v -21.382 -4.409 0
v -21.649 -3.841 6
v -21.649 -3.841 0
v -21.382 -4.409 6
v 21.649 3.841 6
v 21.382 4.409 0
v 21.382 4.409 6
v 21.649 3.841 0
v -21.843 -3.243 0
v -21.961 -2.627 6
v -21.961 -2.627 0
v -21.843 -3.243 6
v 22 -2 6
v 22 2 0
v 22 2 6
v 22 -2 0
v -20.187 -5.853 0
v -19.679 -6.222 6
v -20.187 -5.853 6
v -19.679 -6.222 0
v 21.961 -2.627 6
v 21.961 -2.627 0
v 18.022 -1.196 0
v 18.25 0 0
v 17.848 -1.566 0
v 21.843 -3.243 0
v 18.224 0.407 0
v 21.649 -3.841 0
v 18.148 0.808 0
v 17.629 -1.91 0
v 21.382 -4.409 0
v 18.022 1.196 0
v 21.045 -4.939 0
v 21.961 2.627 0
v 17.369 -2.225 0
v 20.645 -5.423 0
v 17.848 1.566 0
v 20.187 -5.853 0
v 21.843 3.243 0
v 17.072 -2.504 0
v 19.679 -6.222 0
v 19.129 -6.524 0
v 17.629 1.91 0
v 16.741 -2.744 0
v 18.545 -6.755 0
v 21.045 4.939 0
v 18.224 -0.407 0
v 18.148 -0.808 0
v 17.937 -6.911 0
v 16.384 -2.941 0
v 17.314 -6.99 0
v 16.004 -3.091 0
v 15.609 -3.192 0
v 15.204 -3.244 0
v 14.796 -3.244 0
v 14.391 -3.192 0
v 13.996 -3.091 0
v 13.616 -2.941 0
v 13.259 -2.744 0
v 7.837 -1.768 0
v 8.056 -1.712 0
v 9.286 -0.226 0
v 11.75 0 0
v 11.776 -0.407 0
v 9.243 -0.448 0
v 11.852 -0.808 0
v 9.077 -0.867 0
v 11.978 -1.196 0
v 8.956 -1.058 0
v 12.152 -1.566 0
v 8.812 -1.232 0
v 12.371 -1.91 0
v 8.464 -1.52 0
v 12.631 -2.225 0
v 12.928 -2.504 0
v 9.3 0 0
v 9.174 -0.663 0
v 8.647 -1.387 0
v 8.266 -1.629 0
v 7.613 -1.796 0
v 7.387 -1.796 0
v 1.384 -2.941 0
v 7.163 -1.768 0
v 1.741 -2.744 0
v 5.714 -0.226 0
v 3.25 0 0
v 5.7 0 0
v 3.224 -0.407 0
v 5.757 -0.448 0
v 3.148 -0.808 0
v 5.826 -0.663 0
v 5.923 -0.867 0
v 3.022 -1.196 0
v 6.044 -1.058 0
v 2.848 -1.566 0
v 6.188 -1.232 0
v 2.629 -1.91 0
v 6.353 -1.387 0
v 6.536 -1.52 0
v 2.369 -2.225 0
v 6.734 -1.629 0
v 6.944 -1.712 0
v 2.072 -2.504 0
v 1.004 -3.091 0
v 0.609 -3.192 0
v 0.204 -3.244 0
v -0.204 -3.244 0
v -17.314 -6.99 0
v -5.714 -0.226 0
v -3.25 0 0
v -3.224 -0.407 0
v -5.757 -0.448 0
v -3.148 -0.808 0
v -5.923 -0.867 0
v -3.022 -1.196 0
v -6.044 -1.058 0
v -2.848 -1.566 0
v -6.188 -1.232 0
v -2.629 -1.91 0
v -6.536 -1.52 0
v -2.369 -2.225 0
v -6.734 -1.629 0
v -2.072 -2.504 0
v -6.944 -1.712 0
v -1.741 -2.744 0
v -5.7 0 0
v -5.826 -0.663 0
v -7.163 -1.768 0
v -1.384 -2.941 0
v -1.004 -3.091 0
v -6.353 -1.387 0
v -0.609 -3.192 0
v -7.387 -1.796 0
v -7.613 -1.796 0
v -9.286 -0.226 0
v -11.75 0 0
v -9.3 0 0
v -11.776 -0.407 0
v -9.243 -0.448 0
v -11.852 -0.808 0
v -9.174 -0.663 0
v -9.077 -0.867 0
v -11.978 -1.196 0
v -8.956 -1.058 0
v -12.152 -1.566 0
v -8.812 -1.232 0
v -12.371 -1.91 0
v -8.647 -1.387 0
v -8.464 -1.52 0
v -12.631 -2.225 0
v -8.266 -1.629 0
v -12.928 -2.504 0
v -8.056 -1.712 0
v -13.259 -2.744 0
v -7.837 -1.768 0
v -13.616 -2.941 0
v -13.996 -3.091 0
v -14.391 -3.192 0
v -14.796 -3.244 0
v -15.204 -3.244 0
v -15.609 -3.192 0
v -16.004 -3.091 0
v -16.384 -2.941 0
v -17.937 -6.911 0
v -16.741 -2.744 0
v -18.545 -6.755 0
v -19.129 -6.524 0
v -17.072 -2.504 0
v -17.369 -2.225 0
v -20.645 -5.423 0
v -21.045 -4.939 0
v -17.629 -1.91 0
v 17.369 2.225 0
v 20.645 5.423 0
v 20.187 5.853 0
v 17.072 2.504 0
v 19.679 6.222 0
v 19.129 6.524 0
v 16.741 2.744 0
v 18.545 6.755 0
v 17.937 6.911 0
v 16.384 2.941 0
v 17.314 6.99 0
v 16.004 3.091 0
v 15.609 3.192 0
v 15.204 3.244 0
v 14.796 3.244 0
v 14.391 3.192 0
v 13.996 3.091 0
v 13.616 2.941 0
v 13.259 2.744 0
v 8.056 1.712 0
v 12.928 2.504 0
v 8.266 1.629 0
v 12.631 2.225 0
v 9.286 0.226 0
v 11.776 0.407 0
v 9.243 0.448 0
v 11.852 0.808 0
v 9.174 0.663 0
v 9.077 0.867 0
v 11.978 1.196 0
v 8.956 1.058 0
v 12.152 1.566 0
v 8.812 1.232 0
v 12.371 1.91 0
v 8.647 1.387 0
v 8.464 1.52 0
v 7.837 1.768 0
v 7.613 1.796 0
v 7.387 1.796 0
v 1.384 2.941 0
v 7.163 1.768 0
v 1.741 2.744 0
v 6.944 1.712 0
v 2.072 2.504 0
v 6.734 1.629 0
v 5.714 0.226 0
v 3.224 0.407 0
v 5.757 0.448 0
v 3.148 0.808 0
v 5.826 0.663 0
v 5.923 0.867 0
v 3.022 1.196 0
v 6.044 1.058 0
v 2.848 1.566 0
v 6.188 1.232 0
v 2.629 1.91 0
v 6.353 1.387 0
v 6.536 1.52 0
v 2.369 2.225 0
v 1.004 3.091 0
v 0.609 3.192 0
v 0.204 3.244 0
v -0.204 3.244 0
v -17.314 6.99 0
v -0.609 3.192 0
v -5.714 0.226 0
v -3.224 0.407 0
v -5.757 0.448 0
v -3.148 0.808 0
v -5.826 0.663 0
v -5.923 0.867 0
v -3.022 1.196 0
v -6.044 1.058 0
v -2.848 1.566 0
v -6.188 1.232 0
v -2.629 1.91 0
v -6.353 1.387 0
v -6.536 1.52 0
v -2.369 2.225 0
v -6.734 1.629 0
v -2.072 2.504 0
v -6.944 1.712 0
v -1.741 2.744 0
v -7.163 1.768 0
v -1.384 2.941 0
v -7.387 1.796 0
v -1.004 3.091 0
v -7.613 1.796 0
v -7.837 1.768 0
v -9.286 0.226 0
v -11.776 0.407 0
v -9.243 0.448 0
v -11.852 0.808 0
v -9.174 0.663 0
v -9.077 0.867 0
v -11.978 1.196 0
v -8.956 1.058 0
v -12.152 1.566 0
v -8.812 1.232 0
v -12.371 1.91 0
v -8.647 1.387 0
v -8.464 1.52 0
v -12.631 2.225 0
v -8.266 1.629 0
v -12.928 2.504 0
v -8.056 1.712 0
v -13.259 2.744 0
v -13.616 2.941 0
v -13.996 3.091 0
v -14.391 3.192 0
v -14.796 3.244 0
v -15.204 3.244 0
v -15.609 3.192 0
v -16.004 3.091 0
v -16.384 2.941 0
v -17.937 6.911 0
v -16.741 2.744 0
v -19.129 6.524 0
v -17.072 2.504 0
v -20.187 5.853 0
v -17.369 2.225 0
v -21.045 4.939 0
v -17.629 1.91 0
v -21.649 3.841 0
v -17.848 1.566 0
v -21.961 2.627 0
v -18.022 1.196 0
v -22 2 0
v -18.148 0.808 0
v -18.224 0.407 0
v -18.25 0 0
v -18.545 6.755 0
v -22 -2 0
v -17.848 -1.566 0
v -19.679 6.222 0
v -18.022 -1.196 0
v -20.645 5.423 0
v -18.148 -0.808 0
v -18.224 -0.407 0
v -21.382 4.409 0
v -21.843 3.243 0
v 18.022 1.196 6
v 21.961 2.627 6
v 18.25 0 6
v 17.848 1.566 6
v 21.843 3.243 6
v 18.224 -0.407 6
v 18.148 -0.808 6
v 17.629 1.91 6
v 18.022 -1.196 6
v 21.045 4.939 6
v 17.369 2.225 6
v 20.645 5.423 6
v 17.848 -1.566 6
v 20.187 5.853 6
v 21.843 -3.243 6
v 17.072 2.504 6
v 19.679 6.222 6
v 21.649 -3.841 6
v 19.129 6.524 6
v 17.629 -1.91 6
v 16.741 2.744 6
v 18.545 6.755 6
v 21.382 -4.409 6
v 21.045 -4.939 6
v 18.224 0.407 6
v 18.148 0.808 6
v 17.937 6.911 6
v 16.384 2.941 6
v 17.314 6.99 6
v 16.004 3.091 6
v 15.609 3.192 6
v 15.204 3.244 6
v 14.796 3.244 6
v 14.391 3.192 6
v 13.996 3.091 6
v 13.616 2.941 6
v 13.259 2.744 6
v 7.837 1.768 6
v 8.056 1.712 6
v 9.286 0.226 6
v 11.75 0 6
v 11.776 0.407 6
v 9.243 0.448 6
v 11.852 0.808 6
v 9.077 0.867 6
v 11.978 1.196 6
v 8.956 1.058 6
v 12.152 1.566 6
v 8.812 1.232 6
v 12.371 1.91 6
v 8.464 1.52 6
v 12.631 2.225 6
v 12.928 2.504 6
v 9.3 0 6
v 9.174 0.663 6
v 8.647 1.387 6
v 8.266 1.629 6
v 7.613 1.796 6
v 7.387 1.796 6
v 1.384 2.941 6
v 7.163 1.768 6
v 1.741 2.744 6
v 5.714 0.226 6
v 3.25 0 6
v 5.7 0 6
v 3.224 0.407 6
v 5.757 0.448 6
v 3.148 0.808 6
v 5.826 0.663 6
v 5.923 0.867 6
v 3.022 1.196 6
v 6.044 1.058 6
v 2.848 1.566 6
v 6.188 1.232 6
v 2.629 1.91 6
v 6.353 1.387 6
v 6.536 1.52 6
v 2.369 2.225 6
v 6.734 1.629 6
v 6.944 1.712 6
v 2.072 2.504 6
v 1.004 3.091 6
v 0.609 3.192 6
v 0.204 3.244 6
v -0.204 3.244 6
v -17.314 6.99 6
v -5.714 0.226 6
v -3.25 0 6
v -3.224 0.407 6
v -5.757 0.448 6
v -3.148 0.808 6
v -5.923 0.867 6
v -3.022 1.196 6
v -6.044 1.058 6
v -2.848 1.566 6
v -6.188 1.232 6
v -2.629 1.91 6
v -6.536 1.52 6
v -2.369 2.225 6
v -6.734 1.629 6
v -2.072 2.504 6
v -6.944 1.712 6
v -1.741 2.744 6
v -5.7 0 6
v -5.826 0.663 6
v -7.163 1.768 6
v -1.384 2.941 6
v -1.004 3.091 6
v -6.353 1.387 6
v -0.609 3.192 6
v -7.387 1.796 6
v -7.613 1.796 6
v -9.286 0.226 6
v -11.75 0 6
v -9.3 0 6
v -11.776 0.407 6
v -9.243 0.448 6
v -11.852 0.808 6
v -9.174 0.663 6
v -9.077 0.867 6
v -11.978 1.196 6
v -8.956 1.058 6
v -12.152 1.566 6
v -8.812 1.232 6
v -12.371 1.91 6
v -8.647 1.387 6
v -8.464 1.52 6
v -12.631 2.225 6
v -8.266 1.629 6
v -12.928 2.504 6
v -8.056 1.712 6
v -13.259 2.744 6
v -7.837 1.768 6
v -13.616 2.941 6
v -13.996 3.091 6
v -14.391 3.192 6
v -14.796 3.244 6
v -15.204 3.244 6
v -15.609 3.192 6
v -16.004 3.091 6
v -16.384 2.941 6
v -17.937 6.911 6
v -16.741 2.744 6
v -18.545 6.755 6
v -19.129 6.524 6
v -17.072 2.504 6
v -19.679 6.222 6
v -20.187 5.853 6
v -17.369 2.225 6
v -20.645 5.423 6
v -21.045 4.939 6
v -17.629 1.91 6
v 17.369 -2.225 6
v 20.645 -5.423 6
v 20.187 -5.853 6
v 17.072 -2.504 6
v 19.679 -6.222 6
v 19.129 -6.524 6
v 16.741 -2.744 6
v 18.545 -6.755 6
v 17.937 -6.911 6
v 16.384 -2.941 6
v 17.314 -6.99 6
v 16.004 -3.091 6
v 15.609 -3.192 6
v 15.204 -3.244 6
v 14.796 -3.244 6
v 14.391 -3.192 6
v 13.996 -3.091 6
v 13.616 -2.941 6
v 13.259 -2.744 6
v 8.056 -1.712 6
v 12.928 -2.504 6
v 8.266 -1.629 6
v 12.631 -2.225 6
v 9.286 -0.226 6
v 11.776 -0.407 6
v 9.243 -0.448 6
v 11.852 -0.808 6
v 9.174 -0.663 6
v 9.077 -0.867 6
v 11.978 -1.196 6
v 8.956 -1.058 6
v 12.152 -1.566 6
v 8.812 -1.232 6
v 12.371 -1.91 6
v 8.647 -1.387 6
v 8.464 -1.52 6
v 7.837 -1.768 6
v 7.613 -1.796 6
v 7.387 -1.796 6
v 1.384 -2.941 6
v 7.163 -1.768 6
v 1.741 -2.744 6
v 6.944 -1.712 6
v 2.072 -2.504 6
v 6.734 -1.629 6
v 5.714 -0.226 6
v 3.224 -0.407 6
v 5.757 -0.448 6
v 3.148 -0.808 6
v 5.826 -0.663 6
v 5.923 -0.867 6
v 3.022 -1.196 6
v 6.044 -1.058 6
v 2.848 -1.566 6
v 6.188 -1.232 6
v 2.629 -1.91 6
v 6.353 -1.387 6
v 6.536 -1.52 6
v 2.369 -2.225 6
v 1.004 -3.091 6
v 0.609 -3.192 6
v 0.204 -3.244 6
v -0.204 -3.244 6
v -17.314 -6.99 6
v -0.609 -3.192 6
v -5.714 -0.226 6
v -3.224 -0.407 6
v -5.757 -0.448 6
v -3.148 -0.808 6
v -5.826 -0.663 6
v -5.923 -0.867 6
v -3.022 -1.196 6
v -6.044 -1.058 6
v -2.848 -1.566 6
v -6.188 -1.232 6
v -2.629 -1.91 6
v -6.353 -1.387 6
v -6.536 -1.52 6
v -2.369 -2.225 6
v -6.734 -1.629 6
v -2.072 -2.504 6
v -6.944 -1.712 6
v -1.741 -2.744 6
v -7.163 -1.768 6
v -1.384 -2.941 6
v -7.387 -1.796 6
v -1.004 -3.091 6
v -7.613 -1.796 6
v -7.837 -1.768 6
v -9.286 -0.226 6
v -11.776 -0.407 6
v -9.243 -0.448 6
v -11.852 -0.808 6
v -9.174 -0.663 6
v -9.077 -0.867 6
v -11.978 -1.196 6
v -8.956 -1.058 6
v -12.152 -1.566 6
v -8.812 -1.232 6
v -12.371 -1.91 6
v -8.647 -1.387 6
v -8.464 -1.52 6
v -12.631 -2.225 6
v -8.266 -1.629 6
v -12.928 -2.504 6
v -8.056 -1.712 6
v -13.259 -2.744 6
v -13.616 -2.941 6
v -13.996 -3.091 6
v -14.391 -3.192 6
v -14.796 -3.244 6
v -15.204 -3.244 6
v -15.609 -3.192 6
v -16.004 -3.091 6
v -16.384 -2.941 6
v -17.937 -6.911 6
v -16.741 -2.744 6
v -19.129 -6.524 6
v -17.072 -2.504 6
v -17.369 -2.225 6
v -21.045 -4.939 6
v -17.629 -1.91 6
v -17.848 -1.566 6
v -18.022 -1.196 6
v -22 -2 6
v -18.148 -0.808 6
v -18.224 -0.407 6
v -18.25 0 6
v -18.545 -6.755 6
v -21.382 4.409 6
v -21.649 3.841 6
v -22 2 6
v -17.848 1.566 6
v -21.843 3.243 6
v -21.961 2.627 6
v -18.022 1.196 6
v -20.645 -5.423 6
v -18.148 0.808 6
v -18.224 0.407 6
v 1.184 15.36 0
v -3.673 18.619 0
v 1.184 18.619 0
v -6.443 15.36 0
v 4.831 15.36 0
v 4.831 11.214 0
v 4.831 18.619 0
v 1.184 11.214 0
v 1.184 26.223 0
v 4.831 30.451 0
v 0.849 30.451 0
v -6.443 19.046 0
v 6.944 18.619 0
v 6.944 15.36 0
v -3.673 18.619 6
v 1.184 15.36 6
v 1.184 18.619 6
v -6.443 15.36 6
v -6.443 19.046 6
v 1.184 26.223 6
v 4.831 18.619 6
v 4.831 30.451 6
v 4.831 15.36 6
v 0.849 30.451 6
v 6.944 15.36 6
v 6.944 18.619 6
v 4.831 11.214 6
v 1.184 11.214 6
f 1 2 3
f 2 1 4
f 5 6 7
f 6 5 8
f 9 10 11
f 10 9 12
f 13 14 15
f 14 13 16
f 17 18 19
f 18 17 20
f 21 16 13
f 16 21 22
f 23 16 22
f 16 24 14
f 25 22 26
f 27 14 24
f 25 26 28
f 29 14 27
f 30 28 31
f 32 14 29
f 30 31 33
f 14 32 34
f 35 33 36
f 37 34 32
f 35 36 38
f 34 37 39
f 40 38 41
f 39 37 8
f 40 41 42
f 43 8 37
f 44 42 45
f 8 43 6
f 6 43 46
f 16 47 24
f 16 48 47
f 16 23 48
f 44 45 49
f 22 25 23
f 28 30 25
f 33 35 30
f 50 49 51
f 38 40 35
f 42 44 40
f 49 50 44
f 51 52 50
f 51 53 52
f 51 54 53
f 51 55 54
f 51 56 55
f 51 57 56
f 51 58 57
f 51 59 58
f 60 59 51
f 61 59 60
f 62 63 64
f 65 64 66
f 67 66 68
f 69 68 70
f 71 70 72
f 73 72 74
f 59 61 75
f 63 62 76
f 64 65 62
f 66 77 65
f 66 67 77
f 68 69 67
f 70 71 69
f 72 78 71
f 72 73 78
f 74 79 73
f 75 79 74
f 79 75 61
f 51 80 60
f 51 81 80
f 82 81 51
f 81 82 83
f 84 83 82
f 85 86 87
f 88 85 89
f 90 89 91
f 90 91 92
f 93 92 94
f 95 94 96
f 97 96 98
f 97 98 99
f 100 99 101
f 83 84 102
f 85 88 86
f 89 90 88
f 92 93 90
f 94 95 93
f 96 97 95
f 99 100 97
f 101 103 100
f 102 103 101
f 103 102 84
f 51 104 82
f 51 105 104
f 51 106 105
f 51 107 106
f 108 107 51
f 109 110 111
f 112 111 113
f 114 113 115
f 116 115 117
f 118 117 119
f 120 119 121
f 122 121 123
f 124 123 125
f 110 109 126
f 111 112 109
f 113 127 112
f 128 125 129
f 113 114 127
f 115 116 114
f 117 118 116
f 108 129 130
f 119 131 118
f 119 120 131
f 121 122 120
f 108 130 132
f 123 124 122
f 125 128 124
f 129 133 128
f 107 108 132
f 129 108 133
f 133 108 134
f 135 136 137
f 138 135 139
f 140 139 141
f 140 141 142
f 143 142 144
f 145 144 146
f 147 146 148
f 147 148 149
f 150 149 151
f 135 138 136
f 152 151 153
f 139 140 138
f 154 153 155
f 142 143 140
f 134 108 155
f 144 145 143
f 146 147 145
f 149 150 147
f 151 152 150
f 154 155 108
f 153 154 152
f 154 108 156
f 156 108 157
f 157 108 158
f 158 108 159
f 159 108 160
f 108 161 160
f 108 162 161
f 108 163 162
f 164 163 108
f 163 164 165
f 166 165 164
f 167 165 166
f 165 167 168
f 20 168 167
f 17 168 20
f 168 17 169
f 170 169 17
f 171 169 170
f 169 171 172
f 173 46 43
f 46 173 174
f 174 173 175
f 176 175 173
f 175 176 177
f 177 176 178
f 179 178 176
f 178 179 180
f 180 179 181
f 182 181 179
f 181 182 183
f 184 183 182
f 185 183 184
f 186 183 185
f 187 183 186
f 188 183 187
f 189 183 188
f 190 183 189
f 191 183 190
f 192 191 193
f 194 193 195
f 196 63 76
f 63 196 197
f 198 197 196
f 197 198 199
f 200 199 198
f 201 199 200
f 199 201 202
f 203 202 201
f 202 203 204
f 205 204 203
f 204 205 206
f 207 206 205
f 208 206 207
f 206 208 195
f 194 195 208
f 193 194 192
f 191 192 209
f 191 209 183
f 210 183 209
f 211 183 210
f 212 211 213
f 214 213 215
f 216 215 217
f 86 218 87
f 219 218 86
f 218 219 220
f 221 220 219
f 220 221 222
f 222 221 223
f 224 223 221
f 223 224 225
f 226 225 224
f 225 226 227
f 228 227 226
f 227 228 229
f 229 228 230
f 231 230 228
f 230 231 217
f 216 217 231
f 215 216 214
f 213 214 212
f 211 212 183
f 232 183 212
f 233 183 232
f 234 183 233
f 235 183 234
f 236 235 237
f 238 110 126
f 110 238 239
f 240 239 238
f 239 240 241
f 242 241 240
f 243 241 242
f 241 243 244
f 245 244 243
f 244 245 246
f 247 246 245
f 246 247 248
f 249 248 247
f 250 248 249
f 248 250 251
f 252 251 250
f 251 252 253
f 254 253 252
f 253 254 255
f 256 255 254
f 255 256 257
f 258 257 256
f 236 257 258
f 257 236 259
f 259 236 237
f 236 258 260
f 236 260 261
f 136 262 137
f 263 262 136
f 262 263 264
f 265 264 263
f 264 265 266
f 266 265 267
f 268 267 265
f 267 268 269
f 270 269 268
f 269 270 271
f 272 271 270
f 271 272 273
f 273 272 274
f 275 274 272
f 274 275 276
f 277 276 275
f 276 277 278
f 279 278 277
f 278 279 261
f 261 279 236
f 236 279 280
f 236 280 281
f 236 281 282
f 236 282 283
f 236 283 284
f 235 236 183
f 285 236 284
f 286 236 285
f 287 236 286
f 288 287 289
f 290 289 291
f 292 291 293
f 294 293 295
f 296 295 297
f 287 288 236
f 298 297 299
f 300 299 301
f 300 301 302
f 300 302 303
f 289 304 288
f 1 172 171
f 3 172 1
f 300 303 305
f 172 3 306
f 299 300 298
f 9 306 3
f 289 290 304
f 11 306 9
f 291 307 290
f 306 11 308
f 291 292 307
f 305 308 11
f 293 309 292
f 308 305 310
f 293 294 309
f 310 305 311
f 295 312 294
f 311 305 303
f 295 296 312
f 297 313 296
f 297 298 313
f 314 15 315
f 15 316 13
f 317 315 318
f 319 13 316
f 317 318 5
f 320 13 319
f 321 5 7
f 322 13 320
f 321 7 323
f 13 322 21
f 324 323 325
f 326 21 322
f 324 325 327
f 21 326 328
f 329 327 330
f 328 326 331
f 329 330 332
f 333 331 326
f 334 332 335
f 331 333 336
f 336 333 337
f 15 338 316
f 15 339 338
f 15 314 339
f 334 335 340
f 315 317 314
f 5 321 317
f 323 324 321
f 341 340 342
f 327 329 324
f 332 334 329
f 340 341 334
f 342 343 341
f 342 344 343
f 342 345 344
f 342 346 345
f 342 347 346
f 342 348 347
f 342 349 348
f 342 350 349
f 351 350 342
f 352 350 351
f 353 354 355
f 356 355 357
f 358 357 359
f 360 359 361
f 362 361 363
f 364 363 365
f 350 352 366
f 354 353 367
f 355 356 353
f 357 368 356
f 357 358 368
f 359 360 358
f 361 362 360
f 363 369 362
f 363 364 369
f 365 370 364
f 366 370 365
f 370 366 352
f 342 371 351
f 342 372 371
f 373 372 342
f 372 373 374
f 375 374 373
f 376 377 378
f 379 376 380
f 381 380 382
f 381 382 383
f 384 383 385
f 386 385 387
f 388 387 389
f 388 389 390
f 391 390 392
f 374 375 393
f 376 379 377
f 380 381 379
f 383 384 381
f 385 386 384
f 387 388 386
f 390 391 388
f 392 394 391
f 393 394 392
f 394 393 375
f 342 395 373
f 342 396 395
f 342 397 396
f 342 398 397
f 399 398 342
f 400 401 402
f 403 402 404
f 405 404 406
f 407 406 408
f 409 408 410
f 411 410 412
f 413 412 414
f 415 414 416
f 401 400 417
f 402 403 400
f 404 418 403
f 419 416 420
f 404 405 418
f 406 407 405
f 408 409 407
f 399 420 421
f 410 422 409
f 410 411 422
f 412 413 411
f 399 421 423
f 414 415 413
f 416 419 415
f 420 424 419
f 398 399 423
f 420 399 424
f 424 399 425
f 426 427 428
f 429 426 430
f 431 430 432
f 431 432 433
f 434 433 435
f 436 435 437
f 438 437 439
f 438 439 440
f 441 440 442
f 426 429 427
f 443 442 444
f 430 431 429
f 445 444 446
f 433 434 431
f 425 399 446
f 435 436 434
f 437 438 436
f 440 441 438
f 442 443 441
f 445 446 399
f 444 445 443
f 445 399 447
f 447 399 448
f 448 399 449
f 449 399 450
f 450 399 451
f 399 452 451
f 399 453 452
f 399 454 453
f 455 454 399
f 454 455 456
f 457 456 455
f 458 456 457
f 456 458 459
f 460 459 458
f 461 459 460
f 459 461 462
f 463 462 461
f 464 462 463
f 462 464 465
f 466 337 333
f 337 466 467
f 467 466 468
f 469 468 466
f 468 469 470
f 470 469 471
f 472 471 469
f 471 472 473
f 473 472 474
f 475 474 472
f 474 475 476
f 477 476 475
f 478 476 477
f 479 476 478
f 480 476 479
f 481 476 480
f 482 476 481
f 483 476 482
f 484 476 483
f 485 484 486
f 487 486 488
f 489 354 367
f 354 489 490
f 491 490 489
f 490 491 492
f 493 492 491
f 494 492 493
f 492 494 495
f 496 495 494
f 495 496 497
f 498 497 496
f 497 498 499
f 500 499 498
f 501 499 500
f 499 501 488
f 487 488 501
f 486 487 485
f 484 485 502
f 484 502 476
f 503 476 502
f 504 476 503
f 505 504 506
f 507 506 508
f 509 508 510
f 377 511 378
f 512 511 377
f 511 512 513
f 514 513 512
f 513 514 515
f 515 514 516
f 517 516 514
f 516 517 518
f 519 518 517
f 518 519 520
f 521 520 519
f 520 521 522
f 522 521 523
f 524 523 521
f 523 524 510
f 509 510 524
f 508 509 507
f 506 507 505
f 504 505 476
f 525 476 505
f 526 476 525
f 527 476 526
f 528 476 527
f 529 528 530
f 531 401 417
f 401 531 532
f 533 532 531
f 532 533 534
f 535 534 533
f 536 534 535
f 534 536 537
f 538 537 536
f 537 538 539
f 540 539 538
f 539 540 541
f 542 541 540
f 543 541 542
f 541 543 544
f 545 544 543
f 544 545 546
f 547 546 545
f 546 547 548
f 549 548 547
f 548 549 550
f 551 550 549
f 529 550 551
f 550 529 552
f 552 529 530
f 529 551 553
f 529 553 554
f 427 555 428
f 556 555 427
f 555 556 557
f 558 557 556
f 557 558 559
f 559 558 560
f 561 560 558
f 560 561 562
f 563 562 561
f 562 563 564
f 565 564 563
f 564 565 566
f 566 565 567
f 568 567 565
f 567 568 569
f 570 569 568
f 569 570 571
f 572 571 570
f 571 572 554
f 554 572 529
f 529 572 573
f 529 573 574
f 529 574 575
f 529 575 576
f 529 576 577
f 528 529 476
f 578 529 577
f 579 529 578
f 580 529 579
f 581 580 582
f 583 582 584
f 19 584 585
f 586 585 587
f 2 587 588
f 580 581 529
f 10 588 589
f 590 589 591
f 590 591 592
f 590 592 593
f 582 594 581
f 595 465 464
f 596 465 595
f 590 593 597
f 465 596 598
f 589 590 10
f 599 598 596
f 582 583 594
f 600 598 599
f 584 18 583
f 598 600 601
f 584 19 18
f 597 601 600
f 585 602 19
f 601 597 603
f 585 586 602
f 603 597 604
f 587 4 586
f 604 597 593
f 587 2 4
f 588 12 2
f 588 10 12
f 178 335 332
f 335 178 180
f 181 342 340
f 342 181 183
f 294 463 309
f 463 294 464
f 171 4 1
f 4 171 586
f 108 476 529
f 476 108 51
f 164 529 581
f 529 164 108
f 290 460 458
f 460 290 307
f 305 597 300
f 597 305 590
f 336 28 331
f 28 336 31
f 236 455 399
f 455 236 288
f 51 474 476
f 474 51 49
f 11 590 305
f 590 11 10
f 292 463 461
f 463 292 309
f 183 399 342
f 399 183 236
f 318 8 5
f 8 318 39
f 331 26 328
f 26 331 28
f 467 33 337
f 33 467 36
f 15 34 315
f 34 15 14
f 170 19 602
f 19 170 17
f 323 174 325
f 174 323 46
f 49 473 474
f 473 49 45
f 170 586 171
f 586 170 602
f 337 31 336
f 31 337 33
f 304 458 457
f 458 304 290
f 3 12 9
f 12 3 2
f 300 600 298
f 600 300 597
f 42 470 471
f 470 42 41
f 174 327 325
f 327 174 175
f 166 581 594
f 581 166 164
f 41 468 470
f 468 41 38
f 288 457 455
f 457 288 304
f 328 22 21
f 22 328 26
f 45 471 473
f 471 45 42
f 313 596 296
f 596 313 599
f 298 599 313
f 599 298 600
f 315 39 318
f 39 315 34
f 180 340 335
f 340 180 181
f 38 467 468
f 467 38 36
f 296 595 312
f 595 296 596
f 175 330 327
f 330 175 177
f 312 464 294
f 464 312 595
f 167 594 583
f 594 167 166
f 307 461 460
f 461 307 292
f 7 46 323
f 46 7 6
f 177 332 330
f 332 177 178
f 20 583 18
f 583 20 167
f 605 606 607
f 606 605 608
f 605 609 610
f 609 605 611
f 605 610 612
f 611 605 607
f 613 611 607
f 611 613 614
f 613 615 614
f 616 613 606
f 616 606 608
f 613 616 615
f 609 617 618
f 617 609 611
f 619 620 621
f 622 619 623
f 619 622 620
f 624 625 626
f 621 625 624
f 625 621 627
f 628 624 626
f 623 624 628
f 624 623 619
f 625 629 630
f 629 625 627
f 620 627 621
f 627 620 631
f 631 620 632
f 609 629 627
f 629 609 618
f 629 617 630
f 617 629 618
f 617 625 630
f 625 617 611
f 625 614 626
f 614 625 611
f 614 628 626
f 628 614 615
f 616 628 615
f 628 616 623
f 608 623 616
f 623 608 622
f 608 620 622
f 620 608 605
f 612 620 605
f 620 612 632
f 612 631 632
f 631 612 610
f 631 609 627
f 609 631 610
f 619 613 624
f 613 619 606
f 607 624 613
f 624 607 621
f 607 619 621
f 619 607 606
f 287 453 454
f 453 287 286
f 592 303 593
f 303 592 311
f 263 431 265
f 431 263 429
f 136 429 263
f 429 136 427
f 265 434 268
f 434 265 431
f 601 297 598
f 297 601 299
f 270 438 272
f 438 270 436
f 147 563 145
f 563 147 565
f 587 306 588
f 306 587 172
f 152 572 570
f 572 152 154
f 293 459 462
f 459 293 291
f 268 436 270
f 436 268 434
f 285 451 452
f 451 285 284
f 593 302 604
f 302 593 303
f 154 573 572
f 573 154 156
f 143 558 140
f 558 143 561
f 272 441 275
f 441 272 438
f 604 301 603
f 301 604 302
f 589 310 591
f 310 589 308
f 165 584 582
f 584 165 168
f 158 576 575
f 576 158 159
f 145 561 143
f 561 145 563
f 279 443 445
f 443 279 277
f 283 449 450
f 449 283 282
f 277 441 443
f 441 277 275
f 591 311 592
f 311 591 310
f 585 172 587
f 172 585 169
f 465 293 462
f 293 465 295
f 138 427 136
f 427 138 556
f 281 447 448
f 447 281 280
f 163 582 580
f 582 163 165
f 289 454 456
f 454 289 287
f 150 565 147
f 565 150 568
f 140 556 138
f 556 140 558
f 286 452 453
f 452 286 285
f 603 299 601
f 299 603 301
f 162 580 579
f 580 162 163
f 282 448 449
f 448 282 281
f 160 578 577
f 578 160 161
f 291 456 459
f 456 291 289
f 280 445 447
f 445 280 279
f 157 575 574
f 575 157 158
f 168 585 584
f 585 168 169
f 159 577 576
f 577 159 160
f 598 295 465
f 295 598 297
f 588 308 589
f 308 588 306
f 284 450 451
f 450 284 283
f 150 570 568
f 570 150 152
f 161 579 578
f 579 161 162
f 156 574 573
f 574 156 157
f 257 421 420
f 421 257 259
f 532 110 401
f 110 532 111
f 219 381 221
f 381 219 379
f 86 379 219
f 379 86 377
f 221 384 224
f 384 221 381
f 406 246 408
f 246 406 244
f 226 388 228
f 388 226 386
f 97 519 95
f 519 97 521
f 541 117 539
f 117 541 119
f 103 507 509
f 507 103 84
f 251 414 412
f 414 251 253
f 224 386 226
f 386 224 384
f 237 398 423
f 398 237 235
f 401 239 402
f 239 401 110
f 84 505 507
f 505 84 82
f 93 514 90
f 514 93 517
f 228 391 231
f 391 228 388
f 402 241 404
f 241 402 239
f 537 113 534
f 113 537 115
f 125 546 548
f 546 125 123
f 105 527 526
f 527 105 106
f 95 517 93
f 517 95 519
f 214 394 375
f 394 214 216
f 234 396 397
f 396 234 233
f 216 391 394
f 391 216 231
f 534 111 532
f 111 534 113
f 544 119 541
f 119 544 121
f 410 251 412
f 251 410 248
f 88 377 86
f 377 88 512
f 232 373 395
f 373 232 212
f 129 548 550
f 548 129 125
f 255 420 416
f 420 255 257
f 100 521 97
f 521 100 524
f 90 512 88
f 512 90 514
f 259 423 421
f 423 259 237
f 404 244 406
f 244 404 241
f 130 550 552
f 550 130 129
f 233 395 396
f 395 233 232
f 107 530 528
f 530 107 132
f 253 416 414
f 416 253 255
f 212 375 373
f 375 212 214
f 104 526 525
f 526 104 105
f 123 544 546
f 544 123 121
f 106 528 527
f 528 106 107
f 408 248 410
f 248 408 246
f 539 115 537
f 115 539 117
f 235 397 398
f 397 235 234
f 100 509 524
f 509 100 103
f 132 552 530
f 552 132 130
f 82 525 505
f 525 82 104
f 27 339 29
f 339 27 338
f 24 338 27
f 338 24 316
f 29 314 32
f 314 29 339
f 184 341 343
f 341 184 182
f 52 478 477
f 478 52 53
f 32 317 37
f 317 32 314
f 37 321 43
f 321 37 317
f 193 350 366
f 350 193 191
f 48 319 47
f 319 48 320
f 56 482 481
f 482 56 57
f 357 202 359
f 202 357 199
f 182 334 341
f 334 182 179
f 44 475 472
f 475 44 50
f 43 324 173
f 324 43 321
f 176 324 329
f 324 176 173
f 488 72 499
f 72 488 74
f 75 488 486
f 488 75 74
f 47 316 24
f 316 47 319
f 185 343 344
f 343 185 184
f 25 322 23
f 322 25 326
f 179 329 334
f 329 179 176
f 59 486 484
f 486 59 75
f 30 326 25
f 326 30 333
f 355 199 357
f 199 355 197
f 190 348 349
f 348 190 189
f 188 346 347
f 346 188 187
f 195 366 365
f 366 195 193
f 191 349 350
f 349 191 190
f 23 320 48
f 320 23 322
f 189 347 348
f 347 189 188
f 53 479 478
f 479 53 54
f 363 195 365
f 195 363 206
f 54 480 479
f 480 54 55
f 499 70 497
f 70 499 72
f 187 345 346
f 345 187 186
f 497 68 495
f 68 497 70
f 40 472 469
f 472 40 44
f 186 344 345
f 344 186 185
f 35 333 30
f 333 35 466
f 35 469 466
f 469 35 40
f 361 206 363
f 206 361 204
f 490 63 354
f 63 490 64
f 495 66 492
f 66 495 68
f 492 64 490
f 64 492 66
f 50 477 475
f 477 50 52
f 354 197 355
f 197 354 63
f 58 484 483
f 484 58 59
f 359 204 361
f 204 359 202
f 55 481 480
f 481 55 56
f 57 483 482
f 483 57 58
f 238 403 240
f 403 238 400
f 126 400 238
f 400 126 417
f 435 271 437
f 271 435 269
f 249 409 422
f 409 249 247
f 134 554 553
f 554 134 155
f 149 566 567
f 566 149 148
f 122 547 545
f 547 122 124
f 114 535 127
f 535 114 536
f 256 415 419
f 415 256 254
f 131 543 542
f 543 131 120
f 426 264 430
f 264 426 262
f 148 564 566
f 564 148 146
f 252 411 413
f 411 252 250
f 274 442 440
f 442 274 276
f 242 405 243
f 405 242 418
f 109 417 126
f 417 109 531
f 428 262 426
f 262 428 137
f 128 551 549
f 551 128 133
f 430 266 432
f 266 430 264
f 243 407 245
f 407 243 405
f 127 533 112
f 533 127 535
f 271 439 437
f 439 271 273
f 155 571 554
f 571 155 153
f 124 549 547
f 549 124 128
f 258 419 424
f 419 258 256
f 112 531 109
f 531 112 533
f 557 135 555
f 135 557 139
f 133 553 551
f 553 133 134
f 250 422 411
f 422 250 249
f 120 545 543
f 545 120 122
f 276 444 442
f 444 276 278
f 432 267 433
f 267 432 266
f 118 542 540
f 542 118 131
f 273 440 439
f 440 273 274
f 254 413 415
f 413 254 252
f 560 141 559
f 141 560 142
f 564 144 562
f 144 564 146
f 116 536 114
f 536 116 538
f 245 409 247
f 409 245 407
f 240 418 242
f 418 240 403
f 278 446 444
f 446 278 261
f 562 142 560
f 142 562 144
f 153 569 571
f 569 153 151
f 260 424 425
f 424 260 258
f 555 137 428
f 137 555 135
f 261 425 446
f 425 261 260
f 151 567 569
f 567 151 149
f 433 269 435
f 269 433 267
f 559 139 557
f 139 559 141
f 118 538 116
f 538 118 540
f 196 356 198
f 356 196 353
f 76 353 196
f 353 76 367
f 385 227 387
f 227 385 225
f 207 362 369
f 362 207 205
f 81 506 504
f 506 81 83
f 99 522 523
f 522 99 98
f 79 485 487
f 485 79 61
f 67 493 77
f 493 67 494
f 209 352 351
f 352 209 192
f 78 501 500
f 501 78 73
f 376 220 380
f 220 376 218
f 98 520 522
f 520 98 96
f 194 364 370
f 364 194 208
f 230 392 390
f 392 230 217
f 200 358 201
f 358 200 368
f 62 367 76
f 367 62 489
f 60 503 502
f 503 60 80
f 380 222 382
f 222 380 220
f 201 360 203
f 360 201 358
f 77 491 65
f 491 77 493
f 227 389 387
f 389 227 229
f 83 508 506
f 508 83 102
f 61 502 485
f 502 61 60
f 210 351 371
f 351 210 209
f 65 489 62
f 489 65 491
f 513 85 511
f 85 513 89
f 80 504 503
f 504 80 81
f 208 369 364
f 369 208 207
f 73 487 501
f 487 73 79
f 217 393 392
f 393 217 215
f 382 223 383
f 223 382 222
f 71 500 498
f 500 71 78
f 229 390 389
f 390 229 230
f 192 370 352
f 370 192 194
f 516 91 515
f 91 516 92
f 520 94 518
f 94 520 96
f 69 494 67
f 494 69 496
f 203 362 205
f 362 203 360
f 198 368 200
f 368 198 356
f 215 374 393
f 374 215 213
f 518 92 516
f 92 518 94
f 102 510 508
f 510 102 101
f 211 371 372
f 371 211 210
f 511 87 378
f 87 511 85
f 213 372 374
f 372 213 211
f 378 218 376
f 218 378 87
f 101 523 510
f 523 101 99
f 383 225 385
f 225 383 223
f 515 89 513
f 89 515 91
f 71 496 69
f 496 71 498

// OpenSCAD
$fn = 50;


difference() {
	union() {
		hull() {
			translate(v = [-17.0000000000, 2.0000000000, 0]) {
				cylinder(h = 6, r = 5);
			}
			translate(v = [17.0000000000, 2.0000000000, 0]) {
				cylinder(h = 6, r = 5);
			}
			translate(v = [-17.0000000000, -2.0000000000, 0]) {
				cylinder(h = 6, r = 5);
			}
			translate(v = [17.0000000000, -2.0000000000, 0]) {
				cylinder(h = 6, r = 5);
			}
		}
		translate(v = [0, 30.0000000000, 0]) {
			linear_extrude(height = 6) {
				text(font = "DejaVu Sans Mono:style=Bold", halign = "center", size = 19.0000000000, text = "4", valign = "top");
			}
		}
	}
	union() {
		translate(v = [-15.0000000000, 0.0000000000, 0]) {
			translate(v = [0, 0, -100]) {
				cylinder(h = 200, r = 3.2500000000);
			}
		}
		translate(v = [0, 0, -100]) {
			cylinder(h = 200, r = 3.2500000000);
		}
		translate(v = [15.0000000000, 0.0000000000, 0]) {
			translate(v = [0, 0, -100]) {
				cylinder(h = 200, r = 3.2500000000);
			}
		}
		translate(v = [-15.0000000000, 0.0000000000, 0]) {
			translate(v = [0, 0, -100]) {
				cylinder(h = 200, r = 1.8000000000);
			}
		}
		translate(v = [-7.5000000000, 0.0000000000, 0]) {
			translate(v = [0, 0, -100]) {
				cylinder(h = 200, r = 1.8000000000);
			}
		}
		translate(v = [0, 0, -100]) {
			cylinder(h = 200, r = 1.8000000000);
		}
		translate(v = [7.5000000000, 0.0000000000, 0]) {
			translate(v = [0, 0, -100]) {
				cylinder(h = 200, r = 1.8000000000);
			}
		}
		translate(v = [15.0000000000, 0.0000000000, 0]) {
			translate(v = [0, 0, -100]) {
				cylinder(h = 200, r = 1.8000000000);
			}
		}
	}
}
